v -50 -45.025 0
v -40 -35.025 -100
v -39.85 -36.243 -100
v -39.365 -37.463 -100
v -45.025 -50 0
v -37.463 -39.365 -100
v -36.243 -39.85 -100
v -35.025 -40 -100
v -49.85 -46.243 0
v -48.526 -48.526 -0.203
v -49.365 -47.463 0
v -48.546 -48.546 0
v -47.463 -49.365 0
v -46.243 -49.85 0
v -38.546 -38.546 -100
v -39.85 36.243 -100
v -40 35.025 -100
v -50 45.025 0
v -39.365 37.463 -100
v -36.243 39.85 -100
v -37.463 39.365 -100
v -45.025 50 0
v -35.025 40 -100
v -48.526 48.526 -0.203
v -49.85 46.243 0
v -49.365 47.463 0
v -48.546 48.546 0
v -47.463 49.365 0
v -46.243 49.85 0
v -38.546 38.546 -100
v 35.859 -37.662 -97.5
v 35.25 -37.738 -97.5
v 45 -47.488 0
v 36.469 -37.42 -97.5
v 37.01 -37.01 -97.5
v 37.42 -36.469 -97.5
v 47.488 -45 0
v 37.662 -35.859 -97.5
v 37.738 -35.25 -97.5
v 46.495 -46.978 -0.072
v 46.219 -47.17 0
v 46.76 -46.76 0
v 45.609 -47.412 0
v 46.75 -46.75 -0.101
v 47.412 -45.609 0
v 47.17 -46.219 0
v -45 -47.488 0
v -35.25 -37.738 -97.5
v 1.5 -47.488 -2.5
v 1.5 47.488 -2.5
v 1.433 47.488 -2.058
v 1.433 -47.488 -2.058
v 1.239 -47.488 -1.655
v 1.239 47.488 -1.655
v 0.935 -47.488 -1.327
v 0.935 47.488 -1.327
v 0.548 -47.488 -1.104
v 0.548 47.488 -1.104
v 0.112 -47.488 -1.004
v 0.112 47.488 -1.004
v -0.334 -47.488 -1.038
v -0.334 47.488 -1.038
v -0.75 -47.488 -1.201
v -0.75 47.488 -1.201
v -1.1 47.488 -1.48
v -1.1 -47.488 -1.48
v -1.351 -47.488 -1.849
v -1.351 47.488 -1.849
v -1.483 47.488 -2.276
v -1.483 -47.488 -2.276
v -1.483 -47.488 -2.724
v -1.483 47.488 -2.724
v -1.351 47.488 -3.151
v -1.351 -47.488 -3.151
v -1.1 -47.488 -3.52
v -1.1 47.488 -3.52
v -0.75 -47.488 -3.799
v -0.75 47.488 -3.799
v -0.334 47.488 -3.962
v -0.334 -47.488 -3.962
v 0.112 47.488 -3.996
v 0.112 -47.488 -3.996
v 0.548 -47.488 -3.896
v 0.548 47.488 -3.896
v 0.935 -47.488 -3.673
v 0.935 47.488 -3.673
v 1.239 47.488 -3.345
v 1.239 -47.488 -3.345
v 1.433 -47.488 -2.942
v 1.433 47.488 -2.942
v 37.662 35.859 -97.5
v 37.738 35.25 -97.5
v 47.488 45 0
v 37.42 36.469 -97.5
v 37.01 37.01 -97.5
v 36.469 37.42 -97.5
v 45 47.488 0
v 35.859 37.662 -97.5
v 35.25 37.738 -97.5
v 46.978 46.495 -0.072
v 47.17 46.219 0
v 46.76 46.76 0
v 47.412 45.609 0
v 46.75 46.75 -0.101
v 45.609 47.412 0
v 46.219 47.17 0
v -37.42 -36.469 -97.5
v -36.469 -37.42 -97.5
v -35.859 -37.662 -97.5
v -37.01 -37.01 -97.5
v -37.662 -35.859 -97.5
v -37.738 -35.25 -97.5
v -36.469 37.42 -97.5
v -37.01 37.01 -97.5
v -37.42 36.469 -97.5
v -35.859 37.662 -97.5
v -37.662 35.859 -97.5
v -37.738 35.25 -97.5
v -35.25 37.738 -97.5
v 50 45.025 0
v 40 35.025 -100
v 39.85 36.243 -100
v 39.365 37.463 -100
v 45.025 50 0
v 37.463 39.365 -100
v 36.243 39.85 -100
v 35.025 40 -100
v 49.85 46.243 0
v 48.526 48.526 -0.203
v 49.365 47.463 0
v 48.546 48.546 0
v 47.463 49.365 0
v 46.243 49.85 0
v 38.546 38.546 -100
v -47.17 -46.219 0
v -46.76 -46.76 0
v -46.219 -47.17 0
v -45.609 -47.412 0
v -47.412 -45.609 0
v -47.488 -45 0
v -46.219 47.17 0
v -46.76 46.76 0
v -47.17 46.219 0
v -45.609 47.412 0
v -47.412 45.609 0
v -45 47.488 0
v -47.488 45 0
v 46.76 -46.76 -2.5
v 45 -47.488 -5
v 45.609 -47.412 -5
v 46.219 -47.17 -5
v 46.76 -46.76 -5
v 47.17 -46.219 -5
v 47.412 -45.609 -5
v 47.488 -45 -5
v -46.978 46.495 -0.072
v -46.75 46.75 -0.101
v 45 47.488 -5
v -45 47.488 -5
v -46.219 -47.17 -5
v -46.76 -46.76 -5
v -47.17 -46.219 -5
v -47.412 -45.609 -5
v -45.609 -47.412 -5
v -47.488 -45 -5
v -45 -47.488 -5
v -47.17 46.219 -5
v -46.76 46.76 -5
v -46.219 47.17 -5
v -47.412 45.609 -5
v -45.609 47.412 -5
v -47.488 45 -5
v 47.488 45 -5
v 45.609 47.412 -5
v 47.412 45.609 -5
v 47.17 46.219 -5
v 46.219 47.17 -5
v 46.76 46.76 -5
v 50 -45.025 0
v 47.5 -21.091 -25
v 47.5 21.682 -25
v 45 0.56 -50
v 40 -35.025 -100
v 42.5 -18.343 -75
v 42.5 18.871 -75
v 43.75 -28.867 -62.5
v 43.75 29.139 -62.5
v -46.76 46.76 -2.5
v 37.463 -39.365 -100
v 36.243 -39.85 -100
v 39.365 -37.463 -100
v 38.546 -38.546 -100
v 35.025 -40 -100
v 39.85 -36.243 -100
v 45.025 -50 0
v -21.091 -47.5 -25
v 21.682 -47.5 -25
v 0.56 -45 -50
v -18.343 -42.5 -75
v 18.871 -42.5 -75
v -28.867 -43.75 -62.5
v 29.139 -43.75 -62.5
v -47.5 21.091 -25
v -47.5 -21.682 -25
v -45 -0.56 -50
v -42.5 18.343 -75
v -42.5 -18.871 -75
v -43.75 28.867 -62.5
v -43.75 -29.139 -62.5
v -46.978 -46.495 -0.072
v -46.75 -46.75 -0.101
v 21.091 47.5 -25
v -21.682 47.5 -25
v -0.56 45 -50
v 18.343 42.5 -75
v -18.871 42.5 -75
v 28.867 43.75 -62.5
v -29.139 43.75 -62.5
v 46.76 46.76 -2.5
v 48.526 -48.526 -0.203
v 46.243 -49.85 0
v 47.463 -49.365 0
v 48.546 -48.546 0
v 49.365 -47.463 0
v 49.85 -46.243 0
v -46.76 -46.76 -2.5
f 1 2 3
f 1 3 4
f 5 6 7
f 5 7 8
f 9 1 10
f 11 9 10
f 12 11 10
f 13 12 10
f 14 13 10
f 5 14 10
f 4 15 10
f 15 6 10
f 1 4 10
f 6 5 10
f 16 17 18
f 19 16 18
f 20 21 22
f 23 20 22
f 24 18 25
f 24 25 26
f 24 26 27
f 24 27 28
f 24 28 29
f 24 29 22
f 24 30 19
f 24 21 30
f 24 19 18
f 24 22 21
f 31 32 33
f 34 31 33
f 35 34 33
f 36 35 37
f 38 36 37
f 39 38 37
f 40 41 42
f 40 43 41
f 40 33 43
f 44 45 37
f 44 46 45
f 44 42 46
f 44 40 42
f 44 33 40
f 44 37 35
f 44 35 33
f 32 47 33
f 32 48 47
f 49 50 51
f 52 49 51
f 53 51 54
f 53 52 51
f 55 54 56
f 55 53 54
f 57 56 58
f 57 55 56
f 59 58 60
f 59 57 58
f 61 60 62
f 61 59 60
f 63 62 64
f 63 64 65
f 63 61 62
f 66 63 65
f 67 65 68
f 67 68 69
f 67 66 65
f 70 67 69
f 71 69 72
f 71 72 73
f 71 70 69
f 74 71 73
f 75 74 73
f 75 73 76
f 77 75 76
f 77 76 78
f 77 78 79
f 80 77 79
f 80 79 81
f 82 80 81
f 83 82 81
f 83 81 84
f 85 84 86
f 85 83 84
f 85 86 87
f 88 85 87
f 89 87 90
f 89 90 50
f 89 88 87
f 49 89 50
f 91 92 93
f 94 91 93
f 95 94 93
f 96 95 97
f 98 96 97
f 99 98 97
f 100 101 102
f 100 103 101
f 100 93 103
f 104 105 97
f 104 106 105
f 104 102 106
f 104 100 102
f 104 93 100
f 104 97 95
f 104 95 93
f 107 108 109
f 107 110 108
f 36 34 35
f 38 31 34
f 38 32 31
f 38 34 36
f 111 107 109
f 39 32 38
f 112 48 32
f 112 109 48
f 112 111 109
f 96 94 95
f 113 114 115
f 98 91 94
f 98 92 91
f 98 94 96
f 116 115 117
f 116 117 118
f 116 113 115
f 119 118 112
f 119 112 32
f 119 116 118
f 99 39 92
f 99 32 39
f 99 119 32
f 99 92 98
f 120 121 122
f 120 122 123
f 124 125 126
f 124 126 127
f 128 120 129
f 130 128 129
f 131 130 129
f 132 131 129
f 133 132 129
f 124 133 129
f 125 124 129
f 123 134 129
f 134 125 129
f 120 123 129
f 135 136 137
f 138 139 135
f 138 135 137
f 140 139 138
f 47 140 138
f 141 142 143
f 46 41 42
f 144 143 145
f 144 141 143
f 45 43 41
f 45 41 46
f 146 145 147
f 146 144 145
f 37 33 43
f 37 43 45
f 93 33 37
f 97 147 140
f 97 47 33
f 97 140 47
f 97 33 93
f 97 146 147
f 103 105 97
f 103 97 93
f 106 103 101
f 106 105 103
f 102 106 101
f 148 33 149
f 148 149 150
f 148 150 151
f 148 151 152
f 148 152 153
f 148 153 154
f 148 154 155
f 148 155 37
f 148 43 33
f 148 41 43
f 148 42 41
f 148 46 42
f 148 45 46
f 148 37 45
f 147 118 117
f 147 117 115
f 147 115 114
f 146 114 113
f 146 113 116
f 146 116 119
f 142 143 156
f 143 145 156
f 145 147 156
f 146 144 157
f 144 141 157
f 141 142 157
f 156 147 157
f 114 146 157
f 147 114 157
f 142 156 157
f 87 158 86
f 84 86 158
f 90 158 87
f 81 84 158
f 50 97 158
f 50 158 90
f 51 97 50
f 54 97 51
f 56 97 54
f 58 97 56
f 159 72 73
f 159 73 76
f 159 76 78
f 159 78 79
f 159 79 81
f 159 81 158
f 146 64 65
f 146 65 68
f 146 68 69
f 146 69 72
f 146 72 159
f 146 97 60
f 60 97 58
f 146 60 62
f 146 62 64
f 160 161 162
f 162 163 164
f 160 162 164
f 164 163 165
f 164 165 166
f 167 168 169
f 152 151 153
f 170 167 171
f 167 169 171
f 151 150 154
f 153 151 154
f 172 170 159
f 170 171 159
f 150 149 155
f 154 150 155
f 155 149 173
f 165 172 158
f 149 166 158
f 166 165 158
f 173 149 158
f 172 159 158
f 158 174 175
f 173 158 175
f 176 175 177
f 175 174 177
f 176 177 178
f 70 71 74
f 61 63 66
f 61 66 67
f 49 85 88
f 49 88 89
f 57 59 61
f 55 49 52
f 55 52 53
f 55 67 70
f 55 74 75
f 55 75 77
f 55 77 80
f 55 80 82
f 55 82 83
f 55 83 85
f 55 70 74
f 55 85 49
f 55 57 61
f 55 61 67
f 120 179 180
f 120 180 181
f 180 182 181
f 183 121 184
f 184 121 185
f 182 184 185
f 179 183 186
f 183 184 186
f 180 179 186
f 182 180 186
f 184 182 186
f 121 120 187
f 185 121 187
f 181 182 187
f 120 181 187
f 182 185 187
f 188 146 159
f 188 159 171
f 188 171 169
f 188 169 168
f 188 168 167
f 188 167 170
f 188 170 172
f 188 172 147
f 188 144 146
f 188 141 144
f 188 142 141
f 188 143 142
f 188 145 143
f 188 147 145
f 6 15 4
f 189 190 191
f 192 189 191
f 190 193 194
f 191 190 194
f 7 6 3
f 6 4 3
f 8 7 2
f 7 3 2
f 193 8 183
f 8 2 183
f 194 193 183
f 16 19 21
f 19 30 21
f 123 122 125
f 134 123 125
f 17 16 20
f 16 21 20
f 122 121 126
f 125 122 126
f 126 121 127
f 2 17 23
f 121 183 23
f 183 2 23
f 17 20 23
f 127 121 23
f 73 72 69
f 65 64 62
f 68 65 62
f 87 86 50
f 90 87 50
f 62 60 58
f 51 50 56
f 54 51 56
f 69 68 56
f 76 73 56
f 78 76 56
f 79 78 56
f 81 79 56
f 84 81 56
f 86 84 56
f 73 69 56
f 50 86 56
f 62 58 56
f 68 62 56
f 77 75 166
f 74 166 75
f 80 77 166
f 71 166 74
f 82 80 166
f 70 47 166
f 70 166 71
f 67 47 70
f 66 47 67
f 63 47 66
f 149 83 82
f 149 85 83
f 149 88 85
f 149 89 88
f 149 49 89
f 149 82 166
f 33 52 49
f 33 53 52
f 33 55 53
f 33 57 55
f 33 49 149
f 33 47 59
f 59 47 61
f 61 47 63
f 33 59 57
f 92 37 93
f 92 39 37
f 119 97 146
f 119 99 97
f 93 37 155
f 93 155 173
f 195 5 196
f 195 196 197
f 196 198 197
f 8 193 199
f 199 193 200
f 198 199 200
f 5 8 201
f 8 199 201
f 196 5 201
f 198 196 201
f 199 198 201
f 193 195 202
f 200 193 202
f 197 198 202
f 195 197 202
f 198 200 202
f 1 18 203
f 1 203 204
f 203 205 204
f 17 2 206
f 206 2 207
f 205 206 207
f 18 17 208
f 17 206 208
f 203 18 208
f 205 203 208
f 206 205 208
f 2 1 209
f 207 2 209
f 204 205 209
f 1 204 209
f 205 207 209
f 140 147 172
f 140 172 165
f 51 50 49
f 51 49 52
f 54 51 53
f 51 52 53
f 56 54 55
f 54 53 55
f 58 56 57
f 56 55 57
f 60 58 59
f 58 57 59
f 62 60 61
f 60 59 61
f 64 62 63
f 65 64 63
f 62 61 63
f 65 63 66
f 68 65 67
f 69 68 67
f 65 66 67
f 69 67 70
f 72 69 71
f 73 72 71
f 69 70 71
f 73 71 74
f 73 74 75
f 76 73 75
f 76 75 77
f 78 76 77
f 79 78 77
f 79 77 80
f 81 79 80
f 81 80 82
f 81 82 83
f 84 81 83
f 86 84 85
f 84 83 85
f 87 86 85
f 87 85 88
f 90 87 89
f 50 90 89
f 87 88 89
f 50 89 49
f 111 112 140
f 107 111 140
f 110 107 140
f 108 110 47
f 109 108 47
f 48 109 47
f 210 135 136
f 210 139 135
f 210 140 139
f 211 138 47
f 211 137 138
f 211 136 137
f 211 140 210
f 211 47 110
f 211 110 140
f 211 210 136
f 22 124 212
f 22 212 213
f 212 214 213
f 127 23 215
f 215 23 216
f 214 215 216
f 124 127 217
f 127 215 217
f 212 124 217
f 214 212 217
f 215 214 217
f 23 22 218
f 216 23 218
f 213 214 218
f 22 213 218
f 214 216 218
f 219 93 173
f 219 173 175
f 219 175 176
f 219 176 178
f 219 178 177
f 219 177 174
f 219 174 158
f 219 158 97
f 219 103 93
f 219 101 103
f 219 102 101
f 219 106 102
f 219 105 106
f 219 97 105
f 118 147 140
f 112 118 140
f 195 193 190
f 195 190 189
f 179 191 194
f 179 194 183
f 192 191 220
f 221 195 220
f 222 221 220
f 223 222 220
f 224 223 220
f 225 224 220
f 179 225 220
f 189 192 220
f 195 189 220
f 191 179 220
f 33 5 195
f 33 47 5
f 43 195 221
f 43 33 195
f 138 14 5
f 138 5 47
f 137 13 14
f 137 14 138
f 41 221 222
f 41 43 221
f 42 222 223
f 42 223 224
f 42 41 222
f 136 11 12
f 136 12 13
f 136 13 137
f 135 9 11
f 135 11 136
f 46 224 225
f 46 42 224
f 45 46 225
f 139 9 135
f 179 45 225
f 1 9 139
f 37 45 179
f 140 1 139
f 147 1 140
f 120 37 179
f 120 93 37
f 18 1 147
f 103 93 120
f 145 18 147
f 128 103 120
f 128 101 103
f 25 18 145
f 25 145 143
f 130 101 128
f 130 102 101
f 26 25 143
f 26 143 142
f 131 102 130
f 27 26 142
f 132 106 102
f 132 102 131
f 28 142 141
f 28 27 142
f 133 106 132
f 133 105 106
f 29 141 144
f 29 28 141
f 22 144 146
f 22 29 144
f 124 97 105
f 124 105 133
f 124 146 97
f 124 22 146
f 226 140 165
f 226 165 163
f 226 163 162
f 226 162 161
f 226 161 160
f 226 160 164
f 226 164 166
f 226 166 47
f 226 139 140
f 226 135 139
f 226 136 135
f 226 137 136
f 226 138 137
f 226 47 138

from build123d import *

# Parameters (mm, degrees)
F0_W      = 100
F0_H      = 100
F2_W      = 80
F2_H      = 80
F4_R      = 5
F5_T      = -2.5
F7_DEPTH  = 5
F8_R      = 1.5
F9_DEPTH  = 65.6
F10_DEPTH = 47.4875310947
F11_DEPTH = 47.4875310947


with BuildPart() as f3:
    # F0 (on Top) → F3 section 0
    with BuildSketch(Plane.XY):
        Rectangle(F0_W, F0_H)
    # F2 (on offset) → F3 section 1
    with BuildSketch(Plane.XY.offset(-100)):
        Rectangle(F2_W, F2_H)
    loft()

    # F4
    f4_edges = [f3.edges().sort_by_distance(p)[0] for p in [
        (45, 45, -50),
        (-45, 45, -50),
        (-45, -45, -50),
        (45, -45, -50),
    ]]
    fillet(f4_edges, radius=F4_R)

    # F5
    f5_openings = [f3.faces().sort_by_distance(p)[0] for p in [
        (0, 0, 0),
    ]]
    offset(amount=F5_T, openings=f5_openings, kind=Kind.INTERSECTION)


with BuildPart() as f7:
    # F6 (on Top) → F7 (new body)
    with BuildSketch(Plane.XY):
        with BuildLine():
            Line((-47.4875310947, 44.9999381192), (-47.4875310947, -44.9999381192))
            add(Edge.make_bspline(
                [(-47.4875310947, -44.9999381192), (-47.4875310947, -47.4875310947), (-44.9999381192, -47.4875310947)],
                knots=[5.5027377197, 5.5027377197, 5.5027377197, 7.0636328946, 7.0636328946, 7.0636328946], degree=2, weights=[1, 0.7105986878, 1]))
            Line((-44.9999381192, -47.4875310947), (44.9999381192, -47.4875310947))
            add(Edge.make_bspline(
                [(44.9999381192, -47.4875310947), (47.4875310947, -47.4875310947), (47.4875310947, -44.9999381192)],
                knots=[2.3611450661, 2.3611450661, 2.3611450661, 3.9220402411, 3.9220402411, 3.9220402411], degree=2, weights=[1, 0.7105986878, 1]))
            Line((47.4875310947, -44.9999381192), (47.4875310947, 44.9999381192))
            add(Edge.make_bspline(
                [(47.4875310947, 44.9999381192), (47.4875310947, 47.4875310947), (44.9999381192, 47.4875310947)],
                knots=[5.5027377197, 5.5027377197, 5.5027377197, 7.0636328946, 7.0636328946, 7.0636328946], degree=2, weights=[1, 0.7105986878, 1]))
            Line((44.9999381192, 47.4875310947), (-44.9999381192, 47.4875310947))
            add(Edge.make_bspline(
                [(-44.9999381192, 47.4875310947), (-47.4875310947, 47.4875310947), (-47.4875310947, 44.9999381192)],
                knots=[2.3611450661, 2.3611450661, 2.3611450661, 3.9220402411, 3.9220402411, 3.9220402411], degree=2, weights=[1, 0.7105986878, 1]))
        make_face()
    extrude(amount=-F7_DEPTH)

    # F8 (on Front) → F9 (cut, symmetric)
    with BuildSketch(Plane.XZ):
        with Locations((0, -2.5)):
            Circle(F8_R)
    extrude(amount=F9_DEPTH, both=True, mode=Mode.SUBTRACT)


with BuildPart() as f10:
    # F8 (on Front) → F10 (new body, through all)
    with BuildSketch(Plane.XZ):
        with Locations((0, -2.5)):
            Circle(F8_R)
    extrude(amount=F10_DEPTH)

    # F8 (on Front) → F11 (join, through all)
    with BuildSketch(Plane.XZ):
        with Locations((0, -2.5)):
            Circle(F8_R)
    extrude(amount=-F11_DEPTH)


solid = Compound([f3.part, f7.part, f10.part])
